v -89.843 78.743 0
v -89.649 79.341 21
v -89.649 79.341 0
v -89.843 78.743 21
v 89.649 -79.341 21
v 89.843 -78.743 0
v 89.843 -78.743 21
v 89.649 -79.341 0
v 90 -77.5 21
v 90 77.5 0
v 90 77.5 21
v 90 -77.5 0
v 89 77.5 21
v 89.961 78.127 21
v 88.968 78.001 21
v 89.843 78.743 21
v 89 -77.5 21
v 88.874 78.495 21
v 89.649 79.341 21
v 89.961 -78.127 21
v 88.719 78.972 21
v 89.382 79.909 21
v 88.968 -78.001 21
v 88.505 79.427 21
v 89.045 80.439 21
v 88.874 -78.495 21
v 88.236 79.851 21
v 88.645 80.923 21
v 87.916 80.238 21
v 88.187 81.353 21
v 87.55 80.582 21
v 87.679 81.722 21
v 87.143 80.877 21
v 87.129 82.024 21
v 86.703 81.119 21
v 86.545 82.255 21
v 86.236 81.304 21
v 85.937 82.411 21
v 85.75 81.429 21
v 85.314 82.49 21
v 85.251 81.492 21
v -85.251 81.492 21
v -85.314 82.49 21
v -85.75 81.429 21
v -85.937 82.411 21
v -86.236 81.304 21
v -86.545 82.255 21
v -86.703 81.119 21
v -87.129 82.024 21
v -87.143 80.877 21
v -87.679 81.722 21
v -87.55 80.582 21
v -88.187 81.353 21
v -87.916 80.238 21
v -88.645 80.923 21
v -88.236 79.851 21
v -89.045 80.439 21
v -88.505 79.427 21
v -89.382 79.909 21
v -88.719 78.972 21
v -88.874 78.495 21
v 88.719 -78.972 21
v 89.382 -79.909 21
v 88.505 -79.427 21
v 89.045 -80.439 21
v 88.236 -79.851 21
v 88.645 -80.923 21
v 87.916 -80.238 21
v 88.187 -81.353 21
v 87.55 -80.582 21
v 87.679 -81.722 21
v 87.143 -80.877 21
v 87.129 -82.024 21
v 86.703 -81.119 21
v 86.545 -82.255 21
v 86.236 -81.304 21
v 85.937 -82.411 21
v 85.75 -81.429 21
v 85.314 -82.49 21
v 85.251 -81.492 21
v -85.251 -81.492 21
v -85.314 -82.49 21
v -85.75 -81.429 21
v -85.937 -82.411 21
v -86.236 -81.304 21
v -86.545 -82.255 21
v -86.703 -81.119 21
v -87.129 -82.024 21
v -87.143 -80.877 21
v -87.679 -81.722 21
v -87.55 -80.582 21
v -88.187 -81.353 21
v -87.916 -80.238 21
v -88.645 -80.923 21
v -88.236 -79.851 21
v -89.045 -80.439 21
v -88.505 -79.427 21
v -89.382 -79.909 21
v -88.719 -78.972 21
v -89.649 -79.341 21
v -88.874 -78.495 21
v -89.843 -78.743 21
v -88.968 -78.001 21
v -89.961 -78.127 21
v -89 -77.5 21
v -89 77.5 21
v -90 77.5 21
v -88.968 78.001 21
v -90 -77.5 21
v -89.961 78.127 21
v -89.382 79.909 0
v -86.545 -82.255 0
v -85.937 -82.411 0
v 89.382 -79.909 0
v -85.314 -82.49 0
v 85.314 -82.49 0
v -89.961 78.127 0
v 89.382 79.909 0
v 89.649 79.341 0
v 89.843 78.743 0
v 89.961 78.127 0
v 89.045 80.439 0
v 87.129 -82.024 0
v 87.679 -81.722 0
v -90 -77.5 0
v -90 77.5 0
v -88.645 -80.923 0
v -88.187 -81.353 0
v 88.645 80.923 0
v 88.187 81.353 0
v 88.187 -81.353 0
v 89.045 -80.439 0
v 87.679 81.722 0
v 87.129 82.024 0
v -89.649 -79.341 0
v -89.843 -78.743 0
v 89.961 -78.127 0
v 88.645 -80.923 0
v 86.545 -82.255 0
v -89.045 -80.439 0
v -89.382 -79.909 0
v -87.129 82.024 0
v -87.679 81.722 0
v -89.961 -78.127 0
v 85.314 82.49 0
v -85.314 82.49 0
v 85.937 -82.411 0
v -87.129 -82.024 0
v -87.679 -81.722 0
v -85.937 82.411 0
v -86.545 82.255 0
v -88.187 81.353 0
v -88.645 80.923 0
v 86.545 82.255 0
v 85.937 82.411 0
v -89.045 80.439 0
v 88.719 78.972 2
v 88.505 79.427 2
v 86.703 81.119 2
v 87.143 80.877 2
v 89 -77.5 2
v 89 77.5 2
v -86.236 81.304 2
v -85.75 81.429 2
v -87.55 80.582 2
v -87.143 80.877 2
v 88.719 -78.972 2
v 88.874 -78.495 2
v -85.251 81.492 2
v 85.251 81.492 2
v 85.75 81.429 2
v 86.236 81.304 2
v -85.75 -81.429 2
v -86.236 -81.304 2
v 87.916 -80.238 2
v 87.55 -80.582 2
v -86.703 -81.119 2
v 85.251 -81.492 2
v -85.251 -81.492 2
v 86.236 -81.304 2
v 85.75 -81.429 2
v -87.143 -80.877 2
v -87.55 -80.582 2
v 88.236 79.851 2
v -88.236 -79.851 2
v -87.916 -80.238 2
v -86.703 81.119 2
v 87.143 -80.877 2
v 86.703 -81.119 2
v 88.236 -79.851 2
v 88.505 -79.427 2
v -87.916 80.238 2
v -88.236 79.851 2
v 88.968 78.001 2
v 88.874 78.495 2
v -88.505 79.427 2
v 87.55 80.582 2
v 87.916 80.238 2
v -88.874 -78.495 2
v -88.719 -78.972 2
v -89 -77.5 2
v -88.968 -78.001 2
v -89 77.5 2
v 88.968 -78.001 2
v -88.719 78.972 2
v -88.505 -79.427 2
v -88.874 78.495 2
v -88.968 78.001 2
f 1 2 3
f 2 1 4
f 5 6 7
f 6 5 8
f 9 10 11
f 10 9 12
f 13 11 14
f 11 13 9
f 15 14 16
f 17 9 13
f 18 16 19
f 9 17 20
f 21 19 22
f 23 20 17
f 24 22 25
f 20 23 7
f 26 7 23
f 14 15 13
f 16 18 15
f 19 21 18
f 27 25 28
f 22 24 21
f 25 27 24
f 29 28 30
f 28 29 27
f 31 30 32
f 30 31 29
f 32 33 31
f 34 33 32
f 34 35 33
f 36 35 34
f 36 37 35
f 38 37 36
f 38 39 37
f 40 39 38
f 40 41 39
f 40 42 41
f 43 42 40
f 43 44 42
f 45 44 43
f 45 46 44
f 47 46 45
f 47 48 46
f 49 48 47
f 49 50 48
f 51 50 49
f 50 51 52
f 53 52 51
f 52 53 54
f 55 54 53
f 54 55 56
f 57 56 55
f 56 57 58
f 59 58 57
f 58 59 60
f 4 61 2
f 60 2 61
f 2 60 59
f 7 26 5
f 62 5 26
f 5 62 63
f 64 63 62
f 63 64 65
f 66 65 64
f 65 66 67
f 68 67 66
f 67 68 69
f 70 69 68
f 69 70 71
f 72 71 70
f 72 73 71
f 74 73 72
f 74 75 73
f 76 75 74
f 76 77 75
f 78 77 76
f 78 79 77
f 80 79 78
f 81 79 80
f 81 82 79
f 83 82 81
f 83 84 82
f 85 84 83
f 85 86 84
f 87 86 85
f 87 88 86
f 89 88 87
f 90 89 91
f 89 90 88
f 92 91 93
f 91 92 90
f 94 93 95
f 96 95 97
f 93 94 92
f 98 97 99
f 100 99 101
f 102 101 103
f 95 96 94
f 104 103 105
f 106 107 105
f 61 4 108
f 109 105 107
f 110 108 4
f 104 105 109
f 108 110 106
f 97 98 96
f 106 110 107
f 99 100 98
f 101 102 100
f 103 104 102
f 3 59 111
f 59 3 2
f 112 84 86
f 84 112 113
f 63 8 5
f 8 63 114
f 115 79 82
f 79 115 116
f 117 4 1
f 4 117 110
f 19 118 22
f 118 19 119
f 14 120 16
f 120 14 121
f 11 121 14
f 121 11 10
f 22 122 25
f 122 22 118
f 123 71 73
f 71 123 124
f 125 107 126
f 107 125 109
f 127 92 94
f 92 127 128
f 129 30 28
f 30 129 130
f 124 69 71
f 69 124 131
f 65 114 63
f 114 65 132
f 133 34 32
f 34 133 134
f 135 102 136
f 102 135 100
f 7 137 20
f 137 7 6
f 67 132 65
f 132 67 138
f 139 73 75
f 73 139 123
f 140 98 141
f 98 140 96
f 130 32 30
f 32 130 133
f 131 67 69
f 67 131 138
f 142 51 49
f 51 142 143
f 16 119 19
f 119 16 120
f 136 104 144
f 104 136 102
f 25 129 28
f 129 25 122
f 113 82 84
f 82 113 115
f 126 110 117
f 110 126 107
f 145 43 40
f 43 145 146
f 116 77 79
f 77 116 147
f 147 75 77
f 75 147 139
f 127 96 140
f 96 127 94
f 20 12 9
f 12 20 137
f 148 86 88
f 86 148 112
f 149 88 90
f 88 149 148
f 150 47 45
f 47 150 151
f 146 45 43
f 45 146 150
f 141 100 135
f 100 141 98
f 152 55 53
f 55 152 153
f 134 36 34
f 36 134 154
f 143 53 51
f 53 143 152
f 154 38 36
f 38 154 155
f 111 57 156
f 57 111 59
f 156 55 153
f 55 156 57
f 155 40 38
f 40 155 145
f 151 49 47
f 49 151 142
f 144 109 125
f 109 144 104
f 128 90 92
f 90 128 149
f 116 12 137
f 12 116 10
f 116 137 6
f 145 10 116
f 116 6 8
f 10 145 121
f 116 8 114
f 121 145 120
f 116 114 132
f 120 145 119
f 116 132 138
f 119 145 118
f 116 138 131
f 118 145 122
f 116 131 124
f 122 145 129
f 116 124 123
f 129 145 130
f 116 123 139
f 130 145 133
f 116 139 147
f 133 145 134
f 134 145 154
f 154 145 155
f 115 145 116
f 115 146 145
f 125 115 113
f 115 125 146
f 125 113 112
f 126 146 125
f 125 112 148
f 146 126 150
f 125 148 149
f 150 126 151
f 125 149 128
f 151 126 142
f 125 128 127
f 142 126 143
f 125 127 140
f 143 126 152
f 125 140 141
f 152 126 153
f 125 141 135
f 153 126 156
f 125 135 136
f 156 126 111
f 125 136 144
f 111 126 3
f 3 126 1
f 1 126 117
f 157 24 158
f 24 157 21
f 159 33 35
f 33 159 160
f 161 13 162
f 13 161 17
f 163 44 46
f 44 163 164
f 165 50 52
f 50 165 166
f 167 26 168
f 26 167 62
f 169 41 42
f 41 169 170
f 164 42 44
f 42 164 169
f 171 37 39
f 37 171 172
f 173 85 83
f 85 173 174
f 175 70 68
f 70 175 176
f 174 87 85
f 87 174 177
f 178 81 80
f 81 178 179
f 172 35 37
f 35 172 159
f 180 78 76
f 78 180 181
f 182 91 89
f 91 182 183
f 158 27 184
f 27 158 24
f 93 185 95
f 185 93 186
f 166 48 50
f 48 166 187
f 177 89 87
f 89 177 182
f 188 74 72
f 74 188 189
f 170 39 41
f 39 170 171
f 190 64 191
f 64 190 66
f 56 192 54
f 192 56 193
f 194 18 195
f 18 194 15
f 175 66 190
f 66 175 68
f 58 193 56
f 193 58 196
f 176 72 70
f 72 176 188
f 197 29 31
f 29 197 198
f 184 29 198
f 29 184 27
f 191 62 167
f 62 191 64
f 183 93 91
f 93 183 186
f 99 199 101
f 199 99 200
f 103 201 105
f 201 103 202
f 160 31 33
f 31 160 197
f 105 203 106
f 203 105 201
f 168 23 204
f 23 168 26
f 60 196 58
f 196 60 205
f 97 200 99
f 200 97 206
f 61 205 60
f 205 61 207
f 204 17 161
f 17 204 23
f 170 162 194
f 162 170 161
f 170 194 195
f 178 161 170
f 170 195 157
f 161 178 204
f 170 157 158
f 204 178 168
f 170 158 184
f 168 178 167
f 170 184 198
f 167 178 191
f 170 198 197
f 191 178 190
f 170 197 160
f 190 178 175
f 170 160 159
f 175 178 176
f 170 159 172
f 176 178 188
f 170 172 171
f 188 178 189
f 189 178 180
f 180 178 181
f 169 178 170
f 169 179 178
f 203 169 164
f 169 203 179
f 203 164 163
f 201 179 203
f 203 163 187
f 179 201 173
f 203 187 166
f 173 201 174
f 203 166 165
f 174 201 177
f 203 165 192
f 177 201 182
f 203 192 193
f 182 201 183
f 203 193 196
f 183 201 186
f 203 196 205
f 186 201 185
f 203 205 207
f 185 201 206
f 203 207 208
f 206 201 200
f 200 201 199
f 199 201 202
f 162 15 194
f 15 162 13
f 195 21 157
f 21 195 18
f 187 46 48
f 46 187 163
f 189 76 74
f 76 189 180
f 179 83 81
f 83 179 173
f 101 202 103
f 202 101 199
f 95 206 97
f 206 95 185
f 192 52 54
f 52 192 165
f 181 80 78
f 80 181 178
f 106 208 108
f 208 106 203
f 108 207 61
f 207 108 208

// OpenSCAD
$fn = 50;


difference() {
	union() {
		hull() {
			translate(v = [-85.0000000000, 77.5000000000, 0]) {
				cylinder(h = 21, r = 5);
			}
			translate(v = [85.0000000000, 77.5000000000, 0]) {
				cylinder(h = 21, r = 5);
			}
			translate(v = [-85.0000000000, -77.5000000000, 0]) {
				cylinder(h = 21, r = 5);
			}
			translate(v = [85.0000000000, -77.5000000000, 0]) {
				cylinder(h = 21, r = 5);
			}
		}
	}
	union() {
		translate(v = [0, 0, 2]) {
			hull() {
				translate(v = [-85.0000000000, 77.5000000000, 0]) {
					cylinder(h = 19, r = 4);
				}
				translate(v = [85.0000000000, 77.5000000000, 0]) {
					cylinder(h = 19, r = 4);
				}
				translate(v = [-85.0000000000, -77.5000000000, 0]) {
					cylinder(h = 19, r = 4);
				}
				translate(v = [85.0000000000, -77.5000000000, 0]) {
					cylinder(h = 19, r = 4);
				}
			}
		}
	}
}
